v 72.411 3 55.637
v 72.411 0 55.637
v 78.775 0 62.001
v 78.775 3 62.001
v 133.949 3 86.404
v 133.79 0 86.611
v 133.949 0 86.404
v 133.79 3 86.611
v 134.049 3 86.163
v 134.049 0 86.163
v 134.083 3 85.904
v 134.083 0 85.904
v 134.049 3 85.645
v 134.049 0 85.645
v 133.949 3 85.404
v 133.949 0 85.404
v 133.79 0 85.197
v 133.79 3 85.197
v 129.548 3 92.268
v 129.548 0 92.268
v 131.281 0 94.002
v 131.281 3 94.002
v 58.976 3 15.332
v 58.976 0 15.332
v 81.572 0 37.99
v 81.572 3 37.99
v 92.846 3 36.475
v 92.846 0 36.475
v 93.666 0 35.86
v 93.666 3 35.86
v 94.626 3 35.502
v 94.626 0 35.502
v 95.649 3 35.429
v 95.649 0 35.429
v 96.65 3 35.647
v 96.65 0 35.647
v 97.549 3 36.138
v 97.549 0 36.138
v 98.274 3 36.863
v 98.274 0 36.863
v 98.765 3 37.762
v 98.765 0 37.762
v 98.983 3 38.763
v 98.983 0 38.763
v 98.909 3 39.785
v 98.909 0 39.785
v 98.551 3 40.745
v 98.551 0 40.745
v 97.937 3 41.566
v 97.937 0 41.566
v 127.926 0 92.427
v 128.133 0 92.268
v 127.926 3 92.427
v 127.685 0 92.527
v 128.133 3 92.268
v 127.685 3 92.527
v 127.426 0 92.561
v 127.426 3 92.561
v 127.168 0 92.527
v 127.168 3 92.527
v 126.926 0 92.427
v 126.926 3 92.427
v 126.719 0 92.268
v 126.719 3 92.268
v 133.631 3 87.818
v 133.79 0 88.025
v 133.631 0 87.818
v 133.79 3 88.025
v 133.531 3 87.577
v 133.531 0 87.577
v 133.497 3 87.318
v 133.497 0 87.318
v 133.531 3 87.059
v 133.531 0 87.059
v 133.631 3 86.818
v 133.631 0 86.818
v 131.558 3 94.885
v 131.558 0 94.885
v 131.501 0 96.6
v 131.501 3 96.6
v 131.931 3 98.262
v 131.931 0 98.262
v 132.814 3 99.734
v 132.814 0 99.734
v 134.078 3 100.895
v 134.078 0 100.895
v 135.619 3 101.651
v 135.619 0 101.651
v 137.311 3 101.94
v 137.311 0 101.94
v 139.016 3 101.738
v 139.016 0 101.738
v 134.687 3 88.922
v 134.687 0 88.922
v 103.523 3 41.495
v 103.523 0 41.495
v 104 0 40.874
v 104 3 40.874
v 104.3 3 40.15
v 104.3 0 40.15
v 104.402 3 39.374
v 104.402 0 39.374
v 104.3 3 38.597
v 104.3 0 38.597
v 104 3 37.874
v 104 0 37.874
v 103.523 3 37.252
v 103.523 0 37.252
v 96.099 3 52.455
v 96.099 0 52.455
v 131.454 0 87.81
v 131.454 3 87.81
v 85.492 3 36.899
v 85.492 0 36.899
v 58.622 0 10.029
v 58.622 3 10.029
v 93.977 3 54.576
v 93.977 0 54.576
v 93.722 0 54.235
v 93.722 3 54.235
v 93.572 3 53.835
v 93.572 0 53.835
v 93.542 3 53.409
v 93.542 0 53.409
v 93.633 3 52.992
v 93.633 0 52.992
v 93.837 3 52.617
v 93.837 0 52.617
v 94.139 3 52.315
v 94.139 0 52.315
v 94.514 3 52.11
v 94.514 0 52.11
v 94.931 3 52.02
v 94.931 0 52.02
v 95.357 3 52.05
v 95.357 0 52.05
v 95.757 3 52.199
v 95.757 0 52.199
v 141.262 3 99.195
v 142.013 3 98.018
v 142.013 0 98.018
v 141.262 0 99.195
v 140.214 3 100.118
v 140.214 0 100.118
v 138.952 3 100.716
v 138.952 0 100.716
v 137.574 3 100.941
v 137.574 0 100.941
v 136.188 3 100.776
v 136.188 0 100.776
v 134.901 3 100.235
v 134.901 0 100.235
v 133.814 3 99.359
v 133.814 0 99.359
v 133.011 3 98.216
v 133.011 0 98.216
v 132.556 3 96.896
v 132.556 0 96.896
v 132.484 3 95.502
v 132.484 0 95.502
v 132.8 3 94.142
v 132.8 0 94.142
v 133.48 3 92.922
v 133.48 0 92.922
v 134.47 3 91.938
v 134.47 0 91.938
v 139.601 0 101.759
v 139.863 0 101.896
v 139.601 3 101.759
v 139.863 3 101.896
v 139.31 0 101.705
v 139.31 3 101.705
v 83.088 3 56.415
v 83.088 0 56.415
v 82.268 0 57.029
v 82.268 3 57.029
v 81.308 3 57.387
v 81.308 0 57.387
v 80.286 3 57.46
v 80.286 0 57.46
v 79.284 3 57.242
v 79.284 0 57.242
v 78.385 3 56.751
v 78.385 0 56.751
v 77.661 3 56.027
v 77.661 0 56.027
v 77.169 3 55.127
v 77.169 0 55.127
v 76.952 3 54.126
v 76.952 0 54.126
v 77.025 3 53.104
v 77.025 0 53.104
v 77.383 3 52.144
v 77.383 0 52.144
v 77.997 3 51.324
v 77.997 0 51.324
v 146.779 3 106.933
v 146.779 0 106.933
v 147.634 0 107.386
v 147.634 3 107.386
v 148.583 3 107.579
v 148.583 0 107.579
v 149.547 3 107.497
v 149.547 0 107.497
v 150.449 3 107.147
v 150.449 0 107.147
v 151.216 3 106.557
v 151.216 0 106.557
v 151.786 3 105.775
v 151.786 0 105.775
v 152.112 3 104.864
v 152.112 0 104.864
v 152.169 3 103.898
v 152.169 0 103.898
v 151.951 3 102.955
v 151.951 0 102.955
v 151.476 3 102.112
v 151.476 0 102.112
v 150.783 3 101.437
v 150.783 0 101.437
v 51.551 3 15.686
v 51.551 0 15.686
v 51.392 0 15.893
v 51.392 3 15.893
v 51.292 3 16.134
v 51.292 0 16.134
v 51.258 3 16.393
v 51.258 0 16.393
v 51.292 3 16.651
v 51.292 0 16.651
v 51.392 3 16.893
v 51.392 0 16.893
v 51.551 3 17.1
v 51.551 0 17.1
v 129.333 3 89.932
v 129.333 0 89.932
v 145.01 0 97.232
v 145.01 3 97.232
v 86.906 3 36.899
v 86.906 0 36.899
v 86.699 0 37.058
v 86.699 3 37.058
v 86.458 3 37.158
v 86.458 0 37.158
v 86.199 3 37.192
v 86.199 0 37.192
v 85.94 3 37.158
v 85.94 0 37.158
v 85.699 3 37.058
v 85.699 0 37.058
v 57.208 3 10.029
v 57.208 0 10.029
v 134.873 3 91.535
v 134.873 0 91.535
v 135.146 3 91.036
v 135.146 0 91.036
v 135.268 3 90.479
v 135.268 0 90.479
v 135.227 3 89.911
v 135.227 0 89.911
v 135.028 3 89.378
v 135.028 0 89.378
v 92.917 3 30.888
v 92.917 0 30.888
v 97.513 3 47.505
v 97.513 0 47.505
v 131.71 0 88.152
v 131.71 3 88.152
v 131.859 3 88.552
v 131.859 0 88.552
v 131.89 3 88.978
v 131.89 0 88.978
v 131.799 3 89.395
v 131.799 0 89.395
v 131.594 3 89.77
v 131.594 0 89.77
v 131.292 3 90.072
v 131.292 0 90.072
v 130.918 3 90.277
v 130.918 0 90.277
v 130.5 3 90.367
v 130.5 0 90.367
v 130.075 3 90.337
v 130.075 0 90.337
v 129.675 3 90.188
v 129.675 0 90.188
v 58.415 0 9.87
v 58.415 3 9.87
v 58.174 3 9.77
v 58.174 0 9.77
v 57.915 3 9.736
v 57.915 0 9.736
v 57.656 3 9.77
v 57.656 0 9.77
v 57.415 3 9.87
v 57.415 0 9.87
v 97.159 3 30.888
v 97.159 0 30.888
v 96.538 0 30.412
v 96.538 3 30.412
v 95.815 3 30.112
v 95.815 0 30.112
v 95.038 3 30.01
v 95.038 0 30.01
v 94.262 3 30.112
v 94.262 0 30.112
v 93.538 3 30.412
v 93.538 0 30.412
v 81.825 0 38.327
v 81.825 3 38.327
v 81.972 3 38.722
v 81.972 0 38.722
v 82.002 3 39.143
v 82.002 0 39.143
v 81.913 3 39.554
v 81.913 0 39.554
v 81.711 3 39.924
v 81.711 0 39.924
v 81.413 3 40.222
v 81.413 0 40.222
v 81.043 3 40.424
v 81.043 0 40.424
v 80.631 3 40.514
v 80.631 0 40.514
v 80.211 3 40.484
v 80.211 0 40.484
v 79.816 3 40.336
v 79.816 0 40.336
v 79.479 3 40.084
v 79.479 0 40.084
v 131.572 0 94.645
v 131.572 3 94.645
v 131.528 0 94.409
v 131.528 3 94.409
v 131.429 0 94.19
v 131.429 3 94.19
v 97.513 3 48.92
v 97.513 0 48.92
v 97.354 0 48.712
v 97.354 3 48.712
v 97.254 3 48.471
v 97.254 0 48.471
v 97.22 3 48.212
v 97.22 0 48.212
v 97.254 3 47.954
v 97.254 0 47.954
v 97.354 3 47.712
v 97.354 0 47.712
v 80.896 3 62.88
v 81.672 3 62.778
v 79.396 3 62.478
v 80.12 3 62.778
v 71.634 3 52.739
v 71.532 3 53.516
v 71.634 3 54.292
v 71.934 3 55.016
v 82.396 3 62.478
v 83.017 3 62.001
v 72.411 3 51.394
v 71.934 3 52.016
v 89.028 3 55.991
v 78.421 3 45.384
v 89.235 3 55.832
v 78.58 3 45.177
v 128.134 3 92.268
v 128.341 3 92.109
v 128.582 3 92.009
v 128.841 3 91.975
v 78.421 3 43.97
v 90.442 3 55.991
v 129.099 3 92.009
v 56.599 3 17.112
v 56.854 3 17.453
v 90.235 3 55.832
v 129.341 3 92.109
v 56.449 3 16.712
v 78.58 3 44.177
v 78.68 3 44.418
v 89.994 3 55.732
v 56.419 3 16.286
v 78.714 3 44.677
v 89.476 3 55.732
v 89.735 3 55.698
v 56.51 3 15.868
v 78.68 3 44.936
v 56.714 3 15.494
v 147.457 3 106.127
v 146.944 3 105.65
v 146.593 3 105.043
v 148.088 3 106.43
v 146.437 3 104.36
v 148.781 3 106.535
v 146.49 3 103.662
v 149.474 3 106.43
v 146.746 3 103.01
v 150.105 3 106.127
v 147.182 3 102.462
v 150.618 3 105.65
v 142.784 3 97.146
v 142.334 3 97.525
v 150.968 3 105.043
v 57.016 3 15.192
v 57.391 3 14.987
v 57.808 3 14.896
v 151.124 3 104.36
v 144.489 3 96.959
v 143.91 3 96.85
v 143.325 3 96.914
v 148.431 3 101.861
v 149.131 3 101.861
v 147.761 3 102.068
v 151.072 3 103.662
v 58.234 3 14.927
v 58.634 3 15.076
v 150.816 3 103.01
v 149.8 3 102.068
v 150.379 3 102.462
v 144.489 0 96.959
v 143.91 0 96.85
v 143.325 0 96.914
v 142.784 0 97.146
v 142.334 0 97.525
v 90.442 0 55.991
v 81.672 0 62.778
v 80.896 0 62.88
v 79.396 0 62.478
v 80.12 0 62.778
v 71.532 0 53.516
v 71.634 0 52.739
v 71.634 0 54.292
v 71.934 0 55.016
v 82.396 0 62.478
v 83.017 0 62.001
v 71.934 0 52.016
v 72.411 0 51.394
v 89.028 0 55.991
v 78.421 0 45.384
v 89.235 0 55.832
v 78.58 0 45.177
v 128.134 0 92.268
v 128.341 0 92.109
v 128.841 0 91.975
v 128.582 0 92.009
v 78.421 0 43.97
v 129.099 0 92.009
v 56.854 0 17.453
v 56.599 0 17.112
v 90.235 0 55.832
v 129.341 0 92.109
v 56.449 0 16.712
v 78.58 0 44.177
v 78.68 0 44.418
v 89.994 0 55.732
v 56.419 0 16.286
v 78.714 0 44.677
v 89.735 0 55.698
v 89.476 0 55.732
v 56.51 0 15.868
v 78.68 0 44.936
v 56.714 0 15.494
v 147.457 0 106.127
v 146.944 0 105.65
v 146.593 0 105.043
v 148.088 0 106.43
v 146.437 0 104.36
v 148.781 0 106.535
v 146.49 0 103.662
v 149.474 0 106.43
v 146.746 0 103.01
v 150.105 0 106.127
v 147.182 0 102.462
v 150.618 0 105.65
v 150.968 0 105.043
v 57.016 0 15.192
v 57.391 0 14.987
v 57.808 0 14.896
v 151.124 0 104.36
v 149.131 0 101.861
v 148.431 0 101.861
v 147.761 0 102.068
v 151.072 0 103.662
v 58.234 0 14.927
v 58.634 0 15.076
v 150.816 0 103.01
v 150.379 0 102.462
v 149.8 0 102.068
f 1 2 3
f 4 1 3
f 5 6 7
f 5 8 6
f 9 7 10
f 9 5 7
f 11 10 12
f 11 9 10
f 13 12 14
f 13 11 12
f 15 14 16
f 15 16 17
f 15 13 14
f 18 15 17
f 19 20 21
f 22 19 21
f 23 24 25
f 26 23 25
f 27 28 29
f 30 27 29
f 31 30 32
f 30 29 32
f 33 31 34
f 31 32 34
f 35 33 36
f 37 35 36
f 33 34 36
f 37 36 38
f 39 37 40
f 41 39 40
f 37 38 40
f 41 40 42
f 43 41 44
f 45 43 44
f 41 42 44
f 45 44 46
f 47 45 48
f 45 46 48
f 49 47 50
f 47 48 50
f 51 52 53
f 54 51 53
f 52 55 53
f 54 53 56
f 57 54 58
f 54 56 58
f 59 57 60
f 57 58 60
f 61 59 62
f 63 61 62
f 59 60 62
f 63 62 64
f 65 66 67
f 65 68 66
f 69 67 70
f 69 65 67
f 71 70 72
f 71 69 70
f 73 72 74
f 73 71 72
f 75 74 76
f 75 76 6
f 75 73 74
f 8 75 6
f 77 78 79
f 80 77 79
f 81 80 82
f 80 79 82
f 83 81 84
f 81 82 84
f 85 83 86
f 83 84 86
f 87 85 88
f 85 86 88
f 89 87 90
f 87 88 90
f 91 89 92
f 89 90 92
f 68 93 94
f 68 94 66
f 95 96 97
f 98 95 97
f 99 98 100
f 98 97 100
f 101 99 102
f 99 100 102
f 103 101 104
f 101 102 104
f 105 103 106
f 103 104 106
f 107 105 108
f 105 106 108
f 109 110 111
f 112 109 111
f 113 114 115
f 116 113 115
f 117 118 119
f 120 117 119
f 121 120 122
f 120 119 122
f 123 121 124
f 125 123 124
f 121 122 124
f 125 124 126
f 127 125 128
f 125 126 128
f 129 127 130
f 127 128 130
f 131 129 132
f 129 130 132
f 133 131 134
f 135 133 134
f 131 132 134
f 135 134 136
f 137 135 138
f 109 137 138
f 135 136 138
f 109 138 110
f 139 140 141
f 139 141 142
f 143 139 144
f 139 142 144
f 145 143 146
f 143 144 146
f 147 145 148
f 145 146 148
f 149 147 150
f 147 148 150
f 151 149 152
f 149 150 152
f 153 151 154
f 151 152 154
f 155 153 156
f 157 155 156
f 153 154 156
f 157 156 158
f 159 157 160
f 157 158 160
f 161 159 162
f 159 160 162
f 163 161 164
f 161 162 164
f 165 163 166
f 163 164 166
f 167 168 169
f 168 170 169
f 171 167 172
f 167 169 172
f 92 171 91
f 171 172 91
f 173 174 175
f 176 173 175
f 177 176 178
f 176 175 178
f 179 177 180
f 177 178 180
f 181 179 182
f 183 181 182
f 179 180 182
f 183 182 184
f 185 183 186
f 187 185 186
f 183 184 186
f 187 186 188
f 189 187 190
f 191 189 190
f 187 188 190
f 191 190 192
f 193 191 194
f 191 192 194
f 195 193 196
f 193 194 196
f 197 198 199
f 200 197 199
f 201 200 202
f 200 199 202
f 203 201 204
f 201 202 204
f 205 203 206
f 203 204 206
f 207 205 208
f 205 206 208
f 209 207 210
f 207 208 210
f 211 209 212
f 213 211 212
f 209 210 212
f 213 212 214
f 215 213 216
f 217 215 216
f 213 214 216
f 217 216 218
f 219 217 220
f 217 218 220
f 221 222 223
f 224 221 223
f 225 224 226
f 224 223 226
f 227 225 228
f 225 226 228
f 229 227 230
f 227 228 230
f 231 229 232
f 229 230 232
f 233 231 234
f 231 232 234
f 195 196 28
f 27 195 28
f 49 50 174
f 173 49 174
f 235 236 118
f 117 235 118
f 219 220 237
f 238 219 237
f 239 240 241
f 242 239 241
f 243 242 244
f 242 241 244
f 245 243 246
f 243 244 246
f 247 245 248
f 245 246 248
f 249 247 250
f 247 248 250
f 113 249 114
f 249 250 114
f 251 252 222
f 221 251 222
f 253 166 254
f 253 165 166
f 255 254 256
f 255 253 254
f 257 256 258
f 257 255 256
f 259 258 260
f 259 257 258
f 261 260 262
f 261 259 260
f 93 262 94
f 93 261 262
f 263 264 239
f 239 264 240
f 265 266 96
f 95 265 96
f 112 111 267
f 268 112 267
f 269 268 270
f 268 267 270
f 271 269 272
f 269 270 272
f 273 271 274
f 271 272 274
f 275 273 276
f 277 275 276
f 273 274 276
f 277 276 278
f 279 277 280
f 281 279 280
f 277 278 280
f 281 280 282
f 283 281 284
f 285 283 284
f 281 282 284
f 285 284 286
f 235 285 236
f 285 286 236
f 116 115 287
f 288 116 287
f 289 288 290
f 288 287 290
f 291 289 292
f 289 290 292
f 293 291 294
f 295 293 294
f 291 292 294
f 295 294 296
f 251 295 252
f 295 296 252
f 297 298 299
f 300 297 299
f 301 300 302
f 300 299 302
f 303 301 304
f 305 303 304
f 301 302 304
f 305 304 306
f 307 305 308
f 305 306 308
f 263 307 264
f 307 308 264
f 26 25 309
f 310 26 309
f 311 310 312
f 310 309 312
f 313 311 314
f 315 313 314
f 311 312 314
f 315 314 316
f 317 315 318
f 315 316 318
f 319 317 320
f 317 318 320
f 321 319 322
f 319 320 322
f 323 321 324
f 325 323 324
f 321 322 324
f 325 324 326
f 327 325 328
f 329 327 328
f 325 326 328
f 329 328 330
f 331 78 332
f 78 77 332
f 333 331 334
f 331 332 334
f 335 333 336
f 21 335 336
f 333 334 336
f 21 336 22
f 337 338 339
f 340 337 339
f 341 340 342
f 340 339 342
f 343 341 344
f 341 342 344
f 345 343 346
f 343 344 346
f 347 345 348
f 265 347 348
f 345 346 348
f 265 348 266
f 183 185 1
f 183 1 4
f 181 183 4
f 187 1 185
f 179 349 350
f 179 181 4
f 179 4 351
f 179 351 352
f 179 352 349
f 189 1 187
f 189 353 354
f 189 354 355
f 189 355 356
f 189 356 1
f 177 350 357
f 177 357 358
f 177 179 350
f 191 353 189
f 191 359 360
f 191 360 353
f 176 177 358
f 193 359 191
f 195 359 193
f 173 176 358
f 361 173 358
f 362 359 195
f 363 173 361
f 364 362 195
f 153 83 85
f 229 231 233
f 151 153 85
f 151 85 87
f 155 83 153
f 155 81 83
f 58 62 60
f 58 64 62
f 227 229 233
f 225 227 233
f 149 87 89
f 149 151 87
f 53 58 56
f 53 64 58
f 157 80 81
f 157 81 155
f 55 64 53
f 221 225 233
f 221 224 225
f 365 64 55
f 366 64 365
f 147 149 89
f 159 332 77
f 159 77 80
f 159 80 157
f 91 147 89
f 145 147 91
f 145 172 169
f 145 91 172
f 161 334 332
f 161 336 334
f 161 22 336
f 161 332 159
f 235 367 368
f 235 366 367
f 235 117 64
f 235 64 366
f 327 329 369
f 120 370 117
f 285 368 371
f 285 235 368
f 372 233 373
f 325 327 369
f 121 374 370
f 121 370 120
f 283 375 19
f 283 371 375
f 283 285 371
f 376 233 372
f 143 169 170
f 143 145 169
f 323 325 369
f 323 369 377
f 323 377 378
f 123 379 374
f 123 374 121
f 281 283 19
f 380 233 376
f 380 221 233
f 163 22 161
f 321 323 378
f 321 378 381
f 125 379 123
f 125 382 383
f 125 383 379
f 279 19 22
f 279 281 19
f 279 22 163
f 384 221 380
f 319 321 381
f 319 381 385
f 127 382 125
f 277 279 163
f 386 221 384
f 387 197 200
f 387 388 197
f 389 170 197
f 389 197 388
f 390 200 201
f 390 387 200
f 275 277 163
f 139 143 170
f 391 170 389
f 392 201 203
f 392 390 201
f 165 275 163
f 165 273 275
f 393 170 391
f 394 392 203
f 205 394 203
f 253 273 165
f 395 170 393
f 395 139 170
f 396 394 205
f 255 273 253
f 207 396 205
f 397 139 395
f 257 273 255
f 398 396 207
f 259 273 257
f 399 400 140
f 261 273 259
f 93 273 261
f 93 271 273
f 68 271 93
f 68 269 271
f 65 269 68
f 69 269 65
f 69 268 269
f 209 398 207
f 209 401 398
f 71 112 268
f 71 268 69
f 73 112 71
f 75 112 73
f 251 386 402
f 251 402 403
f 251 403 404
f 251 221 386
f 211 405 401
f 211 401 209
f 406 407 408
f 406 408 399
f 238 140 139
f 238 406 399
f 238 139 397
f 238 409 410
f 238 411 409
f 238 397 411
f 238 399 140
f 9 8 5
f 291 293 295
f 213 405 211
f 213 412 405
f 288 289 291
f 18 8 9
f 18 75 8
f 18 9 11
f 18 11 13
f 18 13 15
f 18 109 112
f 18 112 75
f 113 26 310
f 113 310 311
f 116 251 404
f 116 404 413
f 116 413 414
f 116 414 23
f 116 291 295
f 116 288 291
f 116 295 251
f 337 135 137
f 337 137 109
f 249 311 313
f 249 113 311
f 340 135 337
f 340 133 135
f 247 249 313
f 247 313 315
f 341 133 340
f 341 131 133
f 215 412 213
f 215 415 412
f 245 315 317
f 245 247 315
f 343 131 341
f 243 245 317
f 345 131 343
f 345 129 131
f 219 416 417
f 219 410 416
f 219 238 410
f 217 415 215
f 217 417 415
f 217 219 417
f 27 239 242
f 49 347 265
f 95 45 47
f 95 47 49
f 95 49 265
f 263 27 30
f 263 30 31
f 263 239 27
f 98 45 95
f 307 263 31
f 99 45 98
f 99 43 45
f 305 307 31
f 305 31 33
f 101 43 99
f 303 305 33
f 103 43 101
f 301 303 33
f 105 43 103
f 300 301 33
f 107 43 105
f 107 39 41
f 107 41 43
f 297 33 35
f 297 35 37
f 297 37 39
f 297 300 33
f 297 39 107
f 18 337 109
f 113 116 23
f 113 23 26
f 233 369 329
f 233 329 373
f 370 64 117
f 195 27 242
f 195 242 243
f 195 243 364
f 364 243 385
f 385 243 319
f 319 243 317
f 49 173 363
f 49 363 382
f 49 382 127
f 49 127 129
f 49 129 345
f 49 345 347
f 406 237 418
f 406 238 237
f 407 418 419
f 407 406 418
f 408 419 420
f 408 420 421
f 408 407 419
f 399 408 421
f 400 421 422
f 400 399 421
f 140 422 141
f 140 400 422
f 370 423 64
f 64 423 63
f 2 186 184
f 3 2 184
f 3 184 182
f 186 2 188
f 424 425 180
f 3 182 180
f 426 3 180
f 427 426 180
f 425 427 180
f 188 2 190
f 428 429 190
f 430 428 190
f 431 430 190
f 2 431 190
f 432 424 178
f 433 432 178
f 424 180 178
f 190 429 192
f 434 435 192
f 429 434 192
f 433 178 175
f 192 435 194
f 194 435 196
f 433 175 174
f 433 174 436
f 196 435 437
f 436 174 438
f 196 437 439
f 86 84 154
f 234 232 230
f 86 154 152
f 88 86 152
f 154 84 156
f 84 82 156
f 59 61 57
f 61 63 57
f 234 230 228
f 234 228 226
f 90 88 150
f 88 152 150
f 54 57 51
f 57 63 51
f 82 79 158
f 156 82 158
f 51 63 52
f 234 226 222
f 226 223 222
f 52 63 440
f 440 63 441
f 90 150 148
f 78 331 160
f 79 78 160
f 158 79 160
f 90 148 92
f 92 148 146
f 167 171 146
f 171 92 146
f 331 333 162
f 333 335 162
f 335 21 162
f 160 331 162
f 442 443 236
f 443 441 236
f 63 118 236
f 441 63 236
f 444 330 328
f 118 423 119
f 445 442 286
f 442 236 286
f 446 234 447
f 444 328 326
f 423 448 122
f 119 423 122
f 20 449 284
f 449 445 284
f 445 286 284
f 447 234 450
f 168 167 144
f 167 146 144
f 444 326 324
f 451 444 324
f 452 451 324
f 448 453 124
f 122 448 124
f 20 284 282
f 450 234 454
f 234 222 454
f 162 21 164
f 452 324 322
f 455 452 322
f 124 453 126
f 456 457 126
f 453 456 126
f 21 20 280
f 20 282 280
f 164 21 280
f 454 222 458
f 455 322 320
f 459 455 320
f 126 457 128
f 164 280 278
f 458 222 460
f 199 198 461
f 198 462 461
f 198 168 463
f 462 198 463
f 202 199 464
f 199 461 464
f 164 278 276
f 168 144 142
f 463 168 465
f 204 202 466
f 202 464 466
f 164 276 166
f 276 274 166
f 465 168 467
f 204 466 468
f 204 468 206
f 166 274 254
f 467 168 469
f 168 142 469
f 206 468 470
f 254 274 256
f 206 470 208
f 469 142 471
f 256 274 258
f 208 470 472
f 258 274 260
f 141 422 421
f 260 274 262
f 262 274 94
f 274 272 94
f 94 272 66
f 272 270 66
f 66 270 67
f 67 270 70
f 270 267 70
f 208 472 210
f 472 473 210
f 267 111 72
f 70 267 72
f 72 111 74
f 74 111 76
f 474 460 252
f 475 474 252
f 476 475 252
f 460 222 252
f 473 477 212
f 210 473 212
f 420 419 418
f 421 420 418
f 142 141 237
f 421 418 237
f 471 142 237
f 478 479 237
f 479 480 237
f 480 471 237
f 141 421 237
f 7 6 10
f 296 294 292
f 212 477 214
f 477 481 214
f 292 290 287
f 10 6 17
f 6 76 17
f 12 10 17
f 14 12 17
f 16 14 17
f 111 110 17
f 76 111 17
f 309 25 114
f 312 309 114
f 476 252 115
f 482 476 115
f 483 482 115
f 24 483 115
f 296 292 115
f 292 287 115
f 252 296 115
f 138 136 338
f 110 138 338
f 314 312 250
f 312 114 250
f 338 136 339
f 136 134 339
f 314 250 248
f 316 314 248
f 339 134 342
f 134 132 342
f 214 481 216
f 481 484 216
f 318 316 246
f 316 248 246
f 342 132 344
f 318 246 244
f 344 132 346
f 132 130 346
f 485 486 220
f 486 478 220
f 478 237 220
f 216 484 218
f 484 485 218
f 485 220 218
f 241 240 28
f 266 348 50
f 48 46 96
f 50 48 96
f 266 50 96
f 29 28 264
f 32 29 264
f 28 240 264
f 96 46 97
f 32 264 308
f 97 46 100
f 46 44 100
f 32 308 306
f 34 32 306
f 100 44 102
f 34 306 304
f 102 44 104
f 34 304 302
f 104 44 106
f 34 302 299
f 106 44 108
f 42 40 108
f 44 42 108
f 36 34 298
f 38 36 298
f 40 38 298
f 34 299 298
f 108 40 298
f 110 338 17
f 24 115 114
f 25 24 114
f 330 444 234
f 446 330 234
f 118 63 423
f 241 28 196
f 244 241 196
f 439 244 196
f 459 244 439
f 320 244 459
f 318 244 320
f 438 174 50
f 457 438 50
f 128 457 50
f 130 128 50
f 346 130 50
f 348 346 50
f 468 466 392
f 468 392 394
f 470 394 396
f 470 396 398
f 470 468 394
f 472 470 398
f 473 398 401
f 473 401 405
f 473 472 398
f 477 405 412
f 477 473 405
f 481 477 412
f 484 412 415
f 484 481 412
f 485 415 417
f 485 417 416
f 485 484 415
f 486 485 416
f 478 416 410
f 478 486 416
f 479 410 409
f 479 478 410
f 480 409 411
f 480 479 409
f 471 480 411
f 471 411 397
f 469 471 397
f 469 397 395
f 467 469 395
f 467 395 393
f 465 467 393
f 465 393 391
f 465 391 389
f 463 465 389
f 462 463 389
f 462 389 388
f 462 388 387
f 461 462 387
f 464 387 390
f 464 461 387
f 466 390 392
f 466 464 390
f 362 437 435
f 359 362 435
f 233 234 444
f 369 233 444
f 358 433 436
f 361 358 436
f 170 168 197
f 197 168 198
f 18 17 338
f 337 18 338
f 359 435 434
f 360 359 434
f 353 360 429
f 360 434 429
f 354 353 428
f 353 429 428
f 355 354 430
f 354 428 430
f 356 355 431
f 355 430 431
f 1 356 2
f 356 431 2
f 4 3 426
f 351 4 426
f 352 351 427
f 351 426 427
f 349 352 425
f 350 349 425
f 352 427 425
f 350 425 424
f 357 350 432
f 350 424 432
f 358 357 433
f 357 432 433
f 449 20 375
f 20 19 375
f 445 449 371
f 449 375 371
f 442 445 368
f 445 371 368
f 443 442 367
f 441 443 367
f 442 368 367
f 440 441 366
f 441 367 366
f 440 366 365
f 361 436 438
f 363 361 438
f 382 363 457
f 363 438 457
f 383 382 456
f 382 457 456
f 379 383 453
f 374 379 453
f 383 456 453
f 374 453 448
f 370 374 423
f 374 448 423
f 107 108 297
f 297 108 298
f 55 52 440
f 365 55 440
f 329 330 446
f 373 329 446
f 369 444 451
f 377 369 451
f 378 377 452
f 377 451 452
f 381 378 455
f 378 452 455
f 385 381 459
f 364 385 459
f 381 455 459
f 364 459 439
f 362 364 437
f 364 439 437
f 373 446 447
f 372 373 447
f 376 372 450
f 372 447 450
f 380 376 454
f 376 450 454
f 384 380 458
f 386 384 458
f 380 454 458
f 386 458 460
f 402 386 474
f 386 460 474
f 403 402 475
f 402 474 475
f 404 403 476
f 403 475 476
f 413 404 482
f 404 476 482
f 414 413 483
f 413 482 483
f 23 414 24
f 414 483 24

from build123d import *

# Parameters (mm, degrees)
SKETCH1_R           = 2.35
BOSS_EXTRUDE1_DEPTH = 3
FILLET1_R           = 1
FILLET2_R           = 2


with BuildPart() as part:
    # Sketch1 → Boss-Extrude1 (new body)
    with BuildSketch(Plane(origin=(0, 0, 0), x_dir=(1, 0, 0), z_dir=(0, 1, 0))):
        with BuildLine():
            Line((150.782624159, -101.436632834), (142.429643363, -95.352389557))
            ThreePointArc((142.429643363, -95.352389557), (134.417437791, -99.906414375), (136.757444533, -90.99243947))
            Line((136.757444533, -90.99243947), (133.083209919, -87.318204856))
            Line((133.083209919, -87.318204856), (134.497423481, -85.903991293))
            Line((134.497423481, -85.903991293), (97.513018177, -48.919585989))
            ThreePointArc((97.513018177, -48.919585989), (97.220124958, -48.212479208), (97.513018177, -47.505372427))
            Line((97.513018177, -47.505372427), (103.523425817, -41.494964787))
            ThreePointArc((103.523425817, -41.494964787), (104.402105474, -39.373644443), (103.523425817, -37.2523241))
            Line((103.523425817, -37.2523241), (97.159464787, -30.888363069))
            ThreePointArc((97.159464787, -30.888363069), (95.038144443, -30.009683412), (92.9168241, -30.888363069))
            Line((92.9168241, -30.888363069), (86.906416459, -36.898770709))
            ThreePointArc((86.906416459, -36.898770709), (86.199309678, -37.191663928), (85.492202897, -36.898770709))
            Line((85.492202897, -36.898770709), (58.622145212, -10.028713024))
            ThreePointArc((58.622145212, -10.028713024), (57.915038431, -9.735819805), (57.20793165, -10.028713024))
            Line((57.20793165, -10.028713024), (51.5510774, -15.685567273))
            ThreePointArc((51.5510774, -15.685567273), (51.258184181, -16.392674055), (51.5510774, -17.099780836))
            Line((51.5510774, -17.099780836), (78.421135085, -43.969838521))
            ThreePointArc((78.421135085, -43.969838521), (78.714028304, -44.676945302), (78.421135085, -45.384052083))
            Line((78.421135085, -45.384052083), (72.410727445, -51.394459723))
            ThreePointArc((72.410727445, -51.394459723), (71.532047789, -53.515780067), (72.410727445, -55.63710041))
            Line((72.410727445, -55.63710041), (78.774688476, -62.001061441))
            ThreePointArc((78.774688476, -62.001061441), (80.896008819, -62.879741098), (83.017329163, -62.001061441))
            Line((83.017329163, -62.001061441), (89.027736803, -55.990653801))
            ThreePointArc((89.027736803, -55.990653801), (89.734843584, -55.697760582), (90.441950365, -55.990653801))
            Line((90.441950365, -55.990653801), (127.426355669, -92.975059105))
            Line((127.426355669, -92.975059105), (128.840569232, -91.560845543))
            Line((128.840569232, -91.560845543), (131.668996357, -94.389272667))
            ThreePointArc((131.668996357, -94.389272667), (133.388387651, -100.345014415), (139.458762793, -101.601084408))
            Line((139.458762793, -101.601084408), (146.779034385, -106.933110699))
            ThreePointArc((146.779034385, -106.933110699), (151.529068204, -106.186666654), (150.782624159, -101.436632834))
        make_face()
        with Locations(Location((148.780829272, -104.184871767, 0), (0, 0, 270))):
            Circle(SKETCH1_R, mode=Mode.SUBTRACT)
        with BuildLine():
            Line((77.996871016, -51.323749045), (92.846113421, -36.47450664))
            ThreePointArc((92.846113421, -36.47450664), (97.937282246, -36.47450664), (97.937282246, -41.565675465))
            Line((97.937282246, -41.565675465), (83.088039841, -56.41491787))
            ThreePointArc((83.088039841, -56.41491787), (77.996871016, -56.41491787), (77.996871016, -51.323749045))
        make_face(mode=Mode.SUBTRACT)
        with BuildLine():
            Line((96.098804615, -52.455119895), (131.454143674, -87.810458954))
            ThreePointArc((131.454143674, -87.810458954), (131.454143674, -89.931779298), (129.332823331, -89.931779298))
            Line((129.332823331, -89.931779298), (93.977484271, -54.576440239))
            ThreePointArc((93.977484271, -54.576440239), (93.977484271, -52.455119895), (96.098804615, -52.455119895))
        make_face(mode=Mode.SUBTRACT)
        with BuildLine():
            Line((58.975698603, -15.332013883), (81.572324274, -37.990180363))
            ThreePointArc((81.572324274, -37.990180363), (81.572344991, -40.083780173), (79.478745181, -40.08380089))
            Line((79.478745181, -40.08380089), (56.854378259, -17.453334226))
            ThreePointArc((56.854378259, -17.453334226), (56.854378259, -15.332013883), (58.975698603, -15.332013883))
        make_face(mode=Mode.SUBTRACT)
    extrude(amount=BOSS_EXTRUDE1_DEPTH)

    # Fillet1
    fillet1_edges = [part.edges().sort_by_distance(p)[0] for p in [
        (139.458762793, 1.5, 101.601084408),
        (131.668996357, 1.5, 94.389272667),
        (133.083209919, 1.5, 87.318204856),
        (134.497423481, 1.5, 85.903991293),
        (128.840569232, 1.5, 91.560845543),
        (127.426355669, 1.5, 92.975059105),
    ]]
    fillet(fillet1_edges, radius=FILLET1_R - 0.0001)  # a hair under: the kernel refuses the full size

    # Fillet2
    fillet2_edges = [part.edges().sort_by_distance(p)[0] for p in [
        (136.757444533, 1.5, 90.99243947),
        (142.429643363, 1.5, 95.352389557),
    ]]
    fillet(fillet2_edges, radius=FILLET2_R)


solid = part.part
